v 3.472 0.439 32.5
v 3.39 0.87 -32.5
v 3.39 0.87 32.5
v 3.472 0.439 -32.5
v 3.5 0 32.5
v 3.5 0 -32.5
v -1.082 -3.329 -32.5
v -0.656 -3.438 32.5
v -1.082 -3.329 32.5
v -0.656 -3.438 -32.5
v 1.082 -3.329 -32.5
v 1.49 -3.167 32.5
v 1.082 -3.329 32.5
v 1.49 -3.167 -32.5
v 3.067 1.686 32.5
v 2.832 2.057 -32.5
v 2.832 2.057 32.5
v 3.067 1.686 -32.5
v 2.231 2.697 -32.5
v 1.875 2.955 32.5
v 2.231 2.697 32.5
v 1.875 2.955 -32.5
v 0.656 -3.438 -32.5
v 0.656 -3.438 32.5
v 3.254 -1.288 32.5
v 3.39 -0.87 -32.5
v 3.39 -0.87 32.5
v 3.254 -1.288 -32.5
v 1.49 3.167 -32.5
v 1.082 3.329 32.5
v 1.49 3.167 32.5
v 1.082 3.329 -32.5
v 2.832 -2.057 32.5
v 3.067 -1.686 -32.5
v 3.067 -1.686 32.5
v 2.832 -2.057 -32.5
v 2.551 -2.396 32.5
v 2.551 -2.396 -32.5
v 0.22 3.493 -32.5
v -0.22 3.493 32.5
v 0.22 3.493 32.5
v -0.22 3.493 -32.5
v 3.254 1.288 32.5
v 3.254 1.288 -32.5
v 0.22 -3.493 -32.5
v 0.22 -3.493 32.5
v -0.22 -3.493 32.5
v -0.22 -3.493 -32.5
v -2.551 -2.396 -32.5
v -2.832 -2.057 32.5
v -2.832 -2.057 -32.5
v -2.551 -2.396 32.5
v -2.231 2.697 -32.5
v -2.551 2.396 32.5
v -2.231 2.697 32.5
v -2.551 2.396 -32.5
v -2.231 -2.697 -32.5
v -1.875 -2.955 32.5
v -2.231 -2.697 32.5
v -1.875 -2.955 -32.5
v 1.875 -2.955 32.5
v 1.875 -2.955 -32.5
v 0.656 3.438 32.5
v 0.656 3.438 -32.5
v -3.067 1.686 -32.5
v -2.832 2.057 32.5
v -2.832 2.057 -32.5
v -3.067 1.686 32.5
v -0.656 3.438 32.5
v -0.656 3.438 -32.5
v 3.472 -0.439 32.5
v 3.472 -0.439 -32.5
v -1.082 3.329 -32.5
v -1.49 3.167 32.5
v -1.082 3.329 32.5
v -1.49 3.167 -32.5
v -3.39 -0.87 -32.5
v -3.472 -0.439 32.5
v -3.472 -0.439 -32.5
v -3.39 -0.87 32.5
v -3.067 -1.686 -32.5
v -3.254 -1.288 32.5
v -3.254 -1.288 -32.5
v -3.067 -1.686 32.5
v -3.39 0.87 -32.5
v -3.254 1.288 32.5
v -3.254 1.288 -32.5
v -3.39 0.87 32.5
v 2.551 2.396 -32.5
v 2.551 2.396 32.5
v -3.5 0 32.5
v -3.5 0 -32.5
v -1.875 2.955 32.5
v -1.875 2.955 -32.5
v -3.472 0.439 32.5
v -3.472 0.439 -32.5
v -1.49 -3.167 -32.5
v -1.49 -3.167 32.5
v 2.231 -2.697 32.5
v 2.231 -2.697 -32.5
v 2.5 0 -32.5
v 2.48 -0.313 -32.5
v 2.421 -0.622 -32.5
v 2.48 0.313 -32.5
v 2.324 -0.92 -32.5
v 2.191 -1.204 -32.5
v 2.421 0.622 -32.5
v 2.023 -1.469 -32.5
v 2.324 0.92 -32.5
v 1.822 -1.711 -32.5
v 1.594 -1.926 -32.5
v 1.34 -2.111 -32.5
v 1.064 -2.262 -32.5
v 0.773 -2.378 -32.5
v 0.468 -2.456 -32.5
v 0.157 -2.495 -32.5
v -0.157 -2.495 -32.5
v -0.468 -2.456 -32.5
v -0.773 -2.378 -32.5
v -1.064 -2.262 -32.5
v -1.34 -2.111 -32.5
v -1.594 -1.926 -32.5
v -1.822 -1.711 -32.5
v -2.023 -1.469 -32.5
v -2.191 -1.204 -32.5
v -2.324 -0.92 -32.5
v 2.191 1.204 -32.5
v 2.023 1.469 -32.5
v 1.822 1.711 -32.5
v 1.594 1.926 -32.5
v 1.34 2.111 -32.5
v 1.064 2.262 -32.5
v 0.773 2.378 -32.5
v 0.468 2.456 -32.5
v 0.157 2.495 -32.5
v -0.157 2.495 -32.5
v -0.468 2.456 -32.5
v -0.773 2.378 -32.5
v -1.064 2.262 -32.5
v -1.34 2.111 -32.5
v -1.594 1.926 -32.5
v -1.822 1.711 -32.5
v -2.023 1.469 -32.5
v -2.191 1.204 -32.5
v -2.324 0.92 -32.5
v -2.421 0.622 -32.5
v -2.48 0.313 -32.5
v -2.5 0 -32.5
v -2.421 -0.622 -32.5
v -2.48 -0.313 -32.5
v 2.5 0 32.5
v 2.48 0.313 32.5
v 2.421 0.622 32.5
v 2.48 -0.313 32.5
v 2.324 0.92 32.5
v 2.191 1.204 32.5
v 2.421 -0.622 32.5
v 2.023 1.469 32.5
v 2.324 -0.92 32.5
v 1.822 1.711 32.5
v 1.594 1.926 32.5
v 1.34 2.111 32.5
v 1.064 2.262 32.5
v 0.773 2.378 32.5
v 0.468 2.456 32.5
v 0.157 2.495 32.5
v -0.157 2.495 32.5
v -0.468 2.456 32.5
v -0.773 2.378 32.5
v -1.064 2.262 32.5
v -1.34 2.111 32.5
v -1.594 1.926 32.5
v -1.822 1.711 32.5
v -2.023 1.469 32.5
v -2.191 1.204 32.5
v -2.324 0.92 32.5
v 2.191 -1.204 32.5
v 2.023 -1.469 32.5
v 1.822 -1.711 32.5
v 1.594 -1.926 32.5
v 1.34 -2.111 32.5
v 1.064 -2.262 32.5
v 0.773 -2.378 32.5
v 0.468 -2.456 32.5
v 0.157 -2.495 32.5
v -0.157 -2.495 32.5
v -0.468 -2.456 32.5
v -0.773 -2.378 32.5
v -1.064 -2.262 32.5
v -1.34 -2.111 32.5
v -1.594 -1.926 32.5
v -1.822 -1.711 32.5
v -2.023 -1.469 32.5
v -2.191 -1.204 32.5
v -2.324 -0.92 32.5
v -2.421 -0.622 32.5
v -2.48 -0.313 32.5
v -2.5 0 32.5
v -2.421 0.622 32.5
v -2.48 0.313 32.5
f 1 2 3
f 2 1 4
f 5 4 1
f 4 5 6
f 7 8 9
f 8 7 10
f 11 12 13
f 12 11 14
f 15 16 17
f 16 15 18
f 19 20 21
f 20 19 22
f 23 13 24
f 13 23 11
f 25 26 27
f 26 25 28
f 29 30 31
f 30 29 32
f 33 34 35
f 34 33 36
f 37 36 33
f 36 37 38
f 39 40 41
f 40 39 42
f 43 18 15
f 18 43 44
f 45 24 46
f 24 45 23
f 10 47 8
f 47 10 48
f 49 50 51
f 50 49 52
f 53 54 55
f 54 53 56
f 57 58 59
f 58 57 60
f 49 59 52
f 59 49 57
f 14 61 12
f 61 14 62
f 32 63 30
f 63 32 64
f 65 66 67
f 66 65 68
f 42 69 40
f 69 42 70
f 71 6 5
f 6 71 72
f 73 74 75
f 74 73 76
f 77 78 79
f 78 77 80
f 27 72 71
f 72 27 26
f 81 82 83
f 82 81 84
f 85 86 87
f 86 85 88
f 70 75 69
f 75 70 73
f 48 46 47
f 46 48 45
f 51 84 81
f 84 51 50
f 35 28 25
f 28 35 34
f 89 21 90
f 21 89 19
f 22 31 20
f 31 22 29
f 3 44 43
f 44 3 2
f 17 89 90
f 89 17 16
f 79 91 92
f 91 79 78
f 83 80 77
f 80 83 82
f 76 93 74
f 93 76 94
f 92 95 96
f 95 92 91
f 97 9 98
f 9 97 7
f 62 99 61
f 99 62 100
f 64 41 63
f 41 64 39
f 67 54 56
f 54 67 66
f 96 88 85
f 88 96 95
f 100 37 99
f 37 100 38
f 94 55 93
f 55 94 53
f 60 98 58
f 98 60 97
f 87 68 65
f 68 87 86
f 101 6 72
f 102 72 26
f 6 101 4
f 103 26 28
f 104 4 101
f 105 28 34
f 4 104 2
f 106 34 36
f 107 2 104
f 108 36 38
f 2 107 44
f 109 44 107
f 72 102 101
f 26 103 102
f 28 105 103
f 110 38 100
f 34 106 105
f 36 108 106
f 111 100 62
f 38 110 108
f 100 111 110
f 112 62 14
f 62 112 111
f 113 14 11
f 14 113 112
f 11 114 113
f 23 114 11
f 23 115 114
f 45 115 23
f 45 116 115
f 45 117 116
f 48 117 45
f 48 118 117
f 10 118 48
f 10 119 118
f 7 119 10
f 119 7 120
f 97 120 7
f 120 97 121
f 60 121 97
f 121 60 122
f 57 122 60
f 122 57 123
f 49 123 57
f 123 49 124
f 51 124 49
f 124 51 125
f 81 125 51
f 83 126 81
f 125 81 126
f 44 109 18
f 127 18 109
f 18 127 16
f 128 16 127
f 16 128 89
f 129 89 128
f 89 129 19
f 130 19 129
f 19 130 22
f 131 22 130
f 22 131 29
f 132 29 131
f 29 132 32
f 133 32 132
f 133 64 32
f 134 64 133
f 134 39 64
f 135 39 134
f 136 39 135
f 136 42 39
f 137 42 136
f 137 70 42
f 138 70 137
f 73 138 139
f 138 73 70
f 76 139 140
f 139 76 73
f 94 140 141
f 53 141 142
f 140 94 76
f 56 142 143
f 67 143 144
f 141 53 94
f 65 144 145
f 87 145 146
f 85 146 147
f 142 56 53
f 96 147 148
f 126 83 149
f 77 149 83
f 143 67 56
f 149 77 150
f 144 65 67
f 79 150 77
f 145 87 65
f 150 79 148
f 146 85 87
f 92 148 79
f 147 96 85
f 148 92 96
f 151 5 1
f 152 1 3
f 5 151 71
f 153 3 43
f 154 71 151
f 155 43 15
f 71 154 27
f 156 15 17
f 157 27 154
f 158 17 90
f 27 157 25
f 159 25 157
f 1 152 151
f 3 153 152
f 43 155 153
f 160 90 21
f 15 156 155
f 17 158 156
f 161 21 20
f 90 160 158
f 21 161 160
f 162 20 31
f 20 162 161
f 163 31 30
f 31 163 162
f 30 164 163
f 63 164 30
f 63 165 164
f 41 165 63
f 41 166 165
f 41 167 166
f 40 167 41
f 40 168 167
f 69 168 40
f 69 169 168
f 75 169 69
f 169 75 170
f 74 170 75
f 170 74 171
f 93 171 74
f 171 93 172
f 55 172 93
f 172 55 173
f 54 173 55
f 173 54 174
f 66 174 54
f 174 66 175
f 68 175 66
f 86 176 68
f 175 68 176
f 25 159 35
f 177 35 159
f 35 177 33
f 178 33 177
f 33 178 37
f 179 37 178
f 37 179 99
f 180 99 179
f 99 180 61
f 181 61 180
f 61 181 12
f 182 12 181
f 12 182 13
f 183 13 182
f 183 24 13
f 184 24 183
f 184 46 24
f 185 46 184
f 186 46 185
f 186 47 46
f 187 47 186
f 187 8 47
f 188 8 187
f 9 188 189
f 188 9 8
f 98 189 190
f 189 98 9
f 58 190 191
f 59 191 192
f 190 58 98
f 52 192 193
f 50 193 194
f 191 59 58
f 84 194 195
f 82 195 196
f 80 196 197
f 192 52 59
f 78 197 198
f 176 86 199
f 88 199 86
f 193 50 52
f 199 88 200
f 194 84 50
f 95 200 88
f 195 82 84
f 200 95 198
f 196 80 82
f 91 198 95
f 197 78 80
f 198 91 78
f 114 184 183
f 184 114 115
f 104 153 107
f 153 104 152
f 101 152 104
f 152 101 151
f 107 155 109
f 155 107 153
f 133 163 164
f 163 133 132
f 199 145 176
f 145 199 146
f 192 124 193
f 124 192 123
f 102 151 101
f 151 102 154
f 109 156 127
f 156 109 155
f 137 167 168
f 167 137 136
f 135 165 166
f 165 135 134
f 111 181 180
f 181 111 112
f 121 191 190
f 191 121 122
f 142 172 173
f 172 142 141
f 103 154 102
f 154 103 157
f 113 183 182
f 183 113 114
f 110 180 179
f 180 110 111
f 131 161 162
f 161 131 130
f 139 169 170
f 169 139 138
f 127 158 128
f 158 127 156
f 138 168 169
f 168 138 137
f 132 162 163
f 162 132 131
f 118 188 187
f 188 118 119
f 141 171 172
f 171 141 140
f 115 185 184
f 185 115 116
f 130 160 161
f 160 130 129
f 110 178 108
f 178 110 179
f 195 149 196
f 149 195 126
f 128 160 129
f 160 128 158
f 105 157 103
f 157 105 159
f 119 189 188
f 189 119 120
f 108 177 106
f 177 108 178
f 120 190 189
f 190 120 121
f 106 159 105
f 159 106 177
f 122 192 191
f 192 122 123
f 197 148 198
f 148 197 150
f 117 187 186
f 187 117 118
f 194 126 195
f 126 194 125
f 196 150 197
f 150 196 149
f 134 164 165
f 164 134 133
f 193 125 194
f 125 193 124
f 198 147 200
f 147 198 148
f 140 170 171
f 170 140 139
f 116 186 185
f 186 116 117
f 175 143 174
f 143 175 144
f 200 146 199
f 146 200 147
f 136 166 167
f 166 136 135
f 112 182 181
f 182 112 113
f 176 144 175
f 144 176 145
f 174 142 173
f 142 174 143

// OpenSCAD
$fn = 50;


difference() {
	union() {
		translate(v = [0, 0, -32.5000000000]) {
			cylinder(h = 65, r = 3.5000000000);
		}
	}
	union() {
		translate(v = [0, 0, -100.0000000000]) {
			cylinder(h = 200, r = 2.5000000000);
		}
	}
}
